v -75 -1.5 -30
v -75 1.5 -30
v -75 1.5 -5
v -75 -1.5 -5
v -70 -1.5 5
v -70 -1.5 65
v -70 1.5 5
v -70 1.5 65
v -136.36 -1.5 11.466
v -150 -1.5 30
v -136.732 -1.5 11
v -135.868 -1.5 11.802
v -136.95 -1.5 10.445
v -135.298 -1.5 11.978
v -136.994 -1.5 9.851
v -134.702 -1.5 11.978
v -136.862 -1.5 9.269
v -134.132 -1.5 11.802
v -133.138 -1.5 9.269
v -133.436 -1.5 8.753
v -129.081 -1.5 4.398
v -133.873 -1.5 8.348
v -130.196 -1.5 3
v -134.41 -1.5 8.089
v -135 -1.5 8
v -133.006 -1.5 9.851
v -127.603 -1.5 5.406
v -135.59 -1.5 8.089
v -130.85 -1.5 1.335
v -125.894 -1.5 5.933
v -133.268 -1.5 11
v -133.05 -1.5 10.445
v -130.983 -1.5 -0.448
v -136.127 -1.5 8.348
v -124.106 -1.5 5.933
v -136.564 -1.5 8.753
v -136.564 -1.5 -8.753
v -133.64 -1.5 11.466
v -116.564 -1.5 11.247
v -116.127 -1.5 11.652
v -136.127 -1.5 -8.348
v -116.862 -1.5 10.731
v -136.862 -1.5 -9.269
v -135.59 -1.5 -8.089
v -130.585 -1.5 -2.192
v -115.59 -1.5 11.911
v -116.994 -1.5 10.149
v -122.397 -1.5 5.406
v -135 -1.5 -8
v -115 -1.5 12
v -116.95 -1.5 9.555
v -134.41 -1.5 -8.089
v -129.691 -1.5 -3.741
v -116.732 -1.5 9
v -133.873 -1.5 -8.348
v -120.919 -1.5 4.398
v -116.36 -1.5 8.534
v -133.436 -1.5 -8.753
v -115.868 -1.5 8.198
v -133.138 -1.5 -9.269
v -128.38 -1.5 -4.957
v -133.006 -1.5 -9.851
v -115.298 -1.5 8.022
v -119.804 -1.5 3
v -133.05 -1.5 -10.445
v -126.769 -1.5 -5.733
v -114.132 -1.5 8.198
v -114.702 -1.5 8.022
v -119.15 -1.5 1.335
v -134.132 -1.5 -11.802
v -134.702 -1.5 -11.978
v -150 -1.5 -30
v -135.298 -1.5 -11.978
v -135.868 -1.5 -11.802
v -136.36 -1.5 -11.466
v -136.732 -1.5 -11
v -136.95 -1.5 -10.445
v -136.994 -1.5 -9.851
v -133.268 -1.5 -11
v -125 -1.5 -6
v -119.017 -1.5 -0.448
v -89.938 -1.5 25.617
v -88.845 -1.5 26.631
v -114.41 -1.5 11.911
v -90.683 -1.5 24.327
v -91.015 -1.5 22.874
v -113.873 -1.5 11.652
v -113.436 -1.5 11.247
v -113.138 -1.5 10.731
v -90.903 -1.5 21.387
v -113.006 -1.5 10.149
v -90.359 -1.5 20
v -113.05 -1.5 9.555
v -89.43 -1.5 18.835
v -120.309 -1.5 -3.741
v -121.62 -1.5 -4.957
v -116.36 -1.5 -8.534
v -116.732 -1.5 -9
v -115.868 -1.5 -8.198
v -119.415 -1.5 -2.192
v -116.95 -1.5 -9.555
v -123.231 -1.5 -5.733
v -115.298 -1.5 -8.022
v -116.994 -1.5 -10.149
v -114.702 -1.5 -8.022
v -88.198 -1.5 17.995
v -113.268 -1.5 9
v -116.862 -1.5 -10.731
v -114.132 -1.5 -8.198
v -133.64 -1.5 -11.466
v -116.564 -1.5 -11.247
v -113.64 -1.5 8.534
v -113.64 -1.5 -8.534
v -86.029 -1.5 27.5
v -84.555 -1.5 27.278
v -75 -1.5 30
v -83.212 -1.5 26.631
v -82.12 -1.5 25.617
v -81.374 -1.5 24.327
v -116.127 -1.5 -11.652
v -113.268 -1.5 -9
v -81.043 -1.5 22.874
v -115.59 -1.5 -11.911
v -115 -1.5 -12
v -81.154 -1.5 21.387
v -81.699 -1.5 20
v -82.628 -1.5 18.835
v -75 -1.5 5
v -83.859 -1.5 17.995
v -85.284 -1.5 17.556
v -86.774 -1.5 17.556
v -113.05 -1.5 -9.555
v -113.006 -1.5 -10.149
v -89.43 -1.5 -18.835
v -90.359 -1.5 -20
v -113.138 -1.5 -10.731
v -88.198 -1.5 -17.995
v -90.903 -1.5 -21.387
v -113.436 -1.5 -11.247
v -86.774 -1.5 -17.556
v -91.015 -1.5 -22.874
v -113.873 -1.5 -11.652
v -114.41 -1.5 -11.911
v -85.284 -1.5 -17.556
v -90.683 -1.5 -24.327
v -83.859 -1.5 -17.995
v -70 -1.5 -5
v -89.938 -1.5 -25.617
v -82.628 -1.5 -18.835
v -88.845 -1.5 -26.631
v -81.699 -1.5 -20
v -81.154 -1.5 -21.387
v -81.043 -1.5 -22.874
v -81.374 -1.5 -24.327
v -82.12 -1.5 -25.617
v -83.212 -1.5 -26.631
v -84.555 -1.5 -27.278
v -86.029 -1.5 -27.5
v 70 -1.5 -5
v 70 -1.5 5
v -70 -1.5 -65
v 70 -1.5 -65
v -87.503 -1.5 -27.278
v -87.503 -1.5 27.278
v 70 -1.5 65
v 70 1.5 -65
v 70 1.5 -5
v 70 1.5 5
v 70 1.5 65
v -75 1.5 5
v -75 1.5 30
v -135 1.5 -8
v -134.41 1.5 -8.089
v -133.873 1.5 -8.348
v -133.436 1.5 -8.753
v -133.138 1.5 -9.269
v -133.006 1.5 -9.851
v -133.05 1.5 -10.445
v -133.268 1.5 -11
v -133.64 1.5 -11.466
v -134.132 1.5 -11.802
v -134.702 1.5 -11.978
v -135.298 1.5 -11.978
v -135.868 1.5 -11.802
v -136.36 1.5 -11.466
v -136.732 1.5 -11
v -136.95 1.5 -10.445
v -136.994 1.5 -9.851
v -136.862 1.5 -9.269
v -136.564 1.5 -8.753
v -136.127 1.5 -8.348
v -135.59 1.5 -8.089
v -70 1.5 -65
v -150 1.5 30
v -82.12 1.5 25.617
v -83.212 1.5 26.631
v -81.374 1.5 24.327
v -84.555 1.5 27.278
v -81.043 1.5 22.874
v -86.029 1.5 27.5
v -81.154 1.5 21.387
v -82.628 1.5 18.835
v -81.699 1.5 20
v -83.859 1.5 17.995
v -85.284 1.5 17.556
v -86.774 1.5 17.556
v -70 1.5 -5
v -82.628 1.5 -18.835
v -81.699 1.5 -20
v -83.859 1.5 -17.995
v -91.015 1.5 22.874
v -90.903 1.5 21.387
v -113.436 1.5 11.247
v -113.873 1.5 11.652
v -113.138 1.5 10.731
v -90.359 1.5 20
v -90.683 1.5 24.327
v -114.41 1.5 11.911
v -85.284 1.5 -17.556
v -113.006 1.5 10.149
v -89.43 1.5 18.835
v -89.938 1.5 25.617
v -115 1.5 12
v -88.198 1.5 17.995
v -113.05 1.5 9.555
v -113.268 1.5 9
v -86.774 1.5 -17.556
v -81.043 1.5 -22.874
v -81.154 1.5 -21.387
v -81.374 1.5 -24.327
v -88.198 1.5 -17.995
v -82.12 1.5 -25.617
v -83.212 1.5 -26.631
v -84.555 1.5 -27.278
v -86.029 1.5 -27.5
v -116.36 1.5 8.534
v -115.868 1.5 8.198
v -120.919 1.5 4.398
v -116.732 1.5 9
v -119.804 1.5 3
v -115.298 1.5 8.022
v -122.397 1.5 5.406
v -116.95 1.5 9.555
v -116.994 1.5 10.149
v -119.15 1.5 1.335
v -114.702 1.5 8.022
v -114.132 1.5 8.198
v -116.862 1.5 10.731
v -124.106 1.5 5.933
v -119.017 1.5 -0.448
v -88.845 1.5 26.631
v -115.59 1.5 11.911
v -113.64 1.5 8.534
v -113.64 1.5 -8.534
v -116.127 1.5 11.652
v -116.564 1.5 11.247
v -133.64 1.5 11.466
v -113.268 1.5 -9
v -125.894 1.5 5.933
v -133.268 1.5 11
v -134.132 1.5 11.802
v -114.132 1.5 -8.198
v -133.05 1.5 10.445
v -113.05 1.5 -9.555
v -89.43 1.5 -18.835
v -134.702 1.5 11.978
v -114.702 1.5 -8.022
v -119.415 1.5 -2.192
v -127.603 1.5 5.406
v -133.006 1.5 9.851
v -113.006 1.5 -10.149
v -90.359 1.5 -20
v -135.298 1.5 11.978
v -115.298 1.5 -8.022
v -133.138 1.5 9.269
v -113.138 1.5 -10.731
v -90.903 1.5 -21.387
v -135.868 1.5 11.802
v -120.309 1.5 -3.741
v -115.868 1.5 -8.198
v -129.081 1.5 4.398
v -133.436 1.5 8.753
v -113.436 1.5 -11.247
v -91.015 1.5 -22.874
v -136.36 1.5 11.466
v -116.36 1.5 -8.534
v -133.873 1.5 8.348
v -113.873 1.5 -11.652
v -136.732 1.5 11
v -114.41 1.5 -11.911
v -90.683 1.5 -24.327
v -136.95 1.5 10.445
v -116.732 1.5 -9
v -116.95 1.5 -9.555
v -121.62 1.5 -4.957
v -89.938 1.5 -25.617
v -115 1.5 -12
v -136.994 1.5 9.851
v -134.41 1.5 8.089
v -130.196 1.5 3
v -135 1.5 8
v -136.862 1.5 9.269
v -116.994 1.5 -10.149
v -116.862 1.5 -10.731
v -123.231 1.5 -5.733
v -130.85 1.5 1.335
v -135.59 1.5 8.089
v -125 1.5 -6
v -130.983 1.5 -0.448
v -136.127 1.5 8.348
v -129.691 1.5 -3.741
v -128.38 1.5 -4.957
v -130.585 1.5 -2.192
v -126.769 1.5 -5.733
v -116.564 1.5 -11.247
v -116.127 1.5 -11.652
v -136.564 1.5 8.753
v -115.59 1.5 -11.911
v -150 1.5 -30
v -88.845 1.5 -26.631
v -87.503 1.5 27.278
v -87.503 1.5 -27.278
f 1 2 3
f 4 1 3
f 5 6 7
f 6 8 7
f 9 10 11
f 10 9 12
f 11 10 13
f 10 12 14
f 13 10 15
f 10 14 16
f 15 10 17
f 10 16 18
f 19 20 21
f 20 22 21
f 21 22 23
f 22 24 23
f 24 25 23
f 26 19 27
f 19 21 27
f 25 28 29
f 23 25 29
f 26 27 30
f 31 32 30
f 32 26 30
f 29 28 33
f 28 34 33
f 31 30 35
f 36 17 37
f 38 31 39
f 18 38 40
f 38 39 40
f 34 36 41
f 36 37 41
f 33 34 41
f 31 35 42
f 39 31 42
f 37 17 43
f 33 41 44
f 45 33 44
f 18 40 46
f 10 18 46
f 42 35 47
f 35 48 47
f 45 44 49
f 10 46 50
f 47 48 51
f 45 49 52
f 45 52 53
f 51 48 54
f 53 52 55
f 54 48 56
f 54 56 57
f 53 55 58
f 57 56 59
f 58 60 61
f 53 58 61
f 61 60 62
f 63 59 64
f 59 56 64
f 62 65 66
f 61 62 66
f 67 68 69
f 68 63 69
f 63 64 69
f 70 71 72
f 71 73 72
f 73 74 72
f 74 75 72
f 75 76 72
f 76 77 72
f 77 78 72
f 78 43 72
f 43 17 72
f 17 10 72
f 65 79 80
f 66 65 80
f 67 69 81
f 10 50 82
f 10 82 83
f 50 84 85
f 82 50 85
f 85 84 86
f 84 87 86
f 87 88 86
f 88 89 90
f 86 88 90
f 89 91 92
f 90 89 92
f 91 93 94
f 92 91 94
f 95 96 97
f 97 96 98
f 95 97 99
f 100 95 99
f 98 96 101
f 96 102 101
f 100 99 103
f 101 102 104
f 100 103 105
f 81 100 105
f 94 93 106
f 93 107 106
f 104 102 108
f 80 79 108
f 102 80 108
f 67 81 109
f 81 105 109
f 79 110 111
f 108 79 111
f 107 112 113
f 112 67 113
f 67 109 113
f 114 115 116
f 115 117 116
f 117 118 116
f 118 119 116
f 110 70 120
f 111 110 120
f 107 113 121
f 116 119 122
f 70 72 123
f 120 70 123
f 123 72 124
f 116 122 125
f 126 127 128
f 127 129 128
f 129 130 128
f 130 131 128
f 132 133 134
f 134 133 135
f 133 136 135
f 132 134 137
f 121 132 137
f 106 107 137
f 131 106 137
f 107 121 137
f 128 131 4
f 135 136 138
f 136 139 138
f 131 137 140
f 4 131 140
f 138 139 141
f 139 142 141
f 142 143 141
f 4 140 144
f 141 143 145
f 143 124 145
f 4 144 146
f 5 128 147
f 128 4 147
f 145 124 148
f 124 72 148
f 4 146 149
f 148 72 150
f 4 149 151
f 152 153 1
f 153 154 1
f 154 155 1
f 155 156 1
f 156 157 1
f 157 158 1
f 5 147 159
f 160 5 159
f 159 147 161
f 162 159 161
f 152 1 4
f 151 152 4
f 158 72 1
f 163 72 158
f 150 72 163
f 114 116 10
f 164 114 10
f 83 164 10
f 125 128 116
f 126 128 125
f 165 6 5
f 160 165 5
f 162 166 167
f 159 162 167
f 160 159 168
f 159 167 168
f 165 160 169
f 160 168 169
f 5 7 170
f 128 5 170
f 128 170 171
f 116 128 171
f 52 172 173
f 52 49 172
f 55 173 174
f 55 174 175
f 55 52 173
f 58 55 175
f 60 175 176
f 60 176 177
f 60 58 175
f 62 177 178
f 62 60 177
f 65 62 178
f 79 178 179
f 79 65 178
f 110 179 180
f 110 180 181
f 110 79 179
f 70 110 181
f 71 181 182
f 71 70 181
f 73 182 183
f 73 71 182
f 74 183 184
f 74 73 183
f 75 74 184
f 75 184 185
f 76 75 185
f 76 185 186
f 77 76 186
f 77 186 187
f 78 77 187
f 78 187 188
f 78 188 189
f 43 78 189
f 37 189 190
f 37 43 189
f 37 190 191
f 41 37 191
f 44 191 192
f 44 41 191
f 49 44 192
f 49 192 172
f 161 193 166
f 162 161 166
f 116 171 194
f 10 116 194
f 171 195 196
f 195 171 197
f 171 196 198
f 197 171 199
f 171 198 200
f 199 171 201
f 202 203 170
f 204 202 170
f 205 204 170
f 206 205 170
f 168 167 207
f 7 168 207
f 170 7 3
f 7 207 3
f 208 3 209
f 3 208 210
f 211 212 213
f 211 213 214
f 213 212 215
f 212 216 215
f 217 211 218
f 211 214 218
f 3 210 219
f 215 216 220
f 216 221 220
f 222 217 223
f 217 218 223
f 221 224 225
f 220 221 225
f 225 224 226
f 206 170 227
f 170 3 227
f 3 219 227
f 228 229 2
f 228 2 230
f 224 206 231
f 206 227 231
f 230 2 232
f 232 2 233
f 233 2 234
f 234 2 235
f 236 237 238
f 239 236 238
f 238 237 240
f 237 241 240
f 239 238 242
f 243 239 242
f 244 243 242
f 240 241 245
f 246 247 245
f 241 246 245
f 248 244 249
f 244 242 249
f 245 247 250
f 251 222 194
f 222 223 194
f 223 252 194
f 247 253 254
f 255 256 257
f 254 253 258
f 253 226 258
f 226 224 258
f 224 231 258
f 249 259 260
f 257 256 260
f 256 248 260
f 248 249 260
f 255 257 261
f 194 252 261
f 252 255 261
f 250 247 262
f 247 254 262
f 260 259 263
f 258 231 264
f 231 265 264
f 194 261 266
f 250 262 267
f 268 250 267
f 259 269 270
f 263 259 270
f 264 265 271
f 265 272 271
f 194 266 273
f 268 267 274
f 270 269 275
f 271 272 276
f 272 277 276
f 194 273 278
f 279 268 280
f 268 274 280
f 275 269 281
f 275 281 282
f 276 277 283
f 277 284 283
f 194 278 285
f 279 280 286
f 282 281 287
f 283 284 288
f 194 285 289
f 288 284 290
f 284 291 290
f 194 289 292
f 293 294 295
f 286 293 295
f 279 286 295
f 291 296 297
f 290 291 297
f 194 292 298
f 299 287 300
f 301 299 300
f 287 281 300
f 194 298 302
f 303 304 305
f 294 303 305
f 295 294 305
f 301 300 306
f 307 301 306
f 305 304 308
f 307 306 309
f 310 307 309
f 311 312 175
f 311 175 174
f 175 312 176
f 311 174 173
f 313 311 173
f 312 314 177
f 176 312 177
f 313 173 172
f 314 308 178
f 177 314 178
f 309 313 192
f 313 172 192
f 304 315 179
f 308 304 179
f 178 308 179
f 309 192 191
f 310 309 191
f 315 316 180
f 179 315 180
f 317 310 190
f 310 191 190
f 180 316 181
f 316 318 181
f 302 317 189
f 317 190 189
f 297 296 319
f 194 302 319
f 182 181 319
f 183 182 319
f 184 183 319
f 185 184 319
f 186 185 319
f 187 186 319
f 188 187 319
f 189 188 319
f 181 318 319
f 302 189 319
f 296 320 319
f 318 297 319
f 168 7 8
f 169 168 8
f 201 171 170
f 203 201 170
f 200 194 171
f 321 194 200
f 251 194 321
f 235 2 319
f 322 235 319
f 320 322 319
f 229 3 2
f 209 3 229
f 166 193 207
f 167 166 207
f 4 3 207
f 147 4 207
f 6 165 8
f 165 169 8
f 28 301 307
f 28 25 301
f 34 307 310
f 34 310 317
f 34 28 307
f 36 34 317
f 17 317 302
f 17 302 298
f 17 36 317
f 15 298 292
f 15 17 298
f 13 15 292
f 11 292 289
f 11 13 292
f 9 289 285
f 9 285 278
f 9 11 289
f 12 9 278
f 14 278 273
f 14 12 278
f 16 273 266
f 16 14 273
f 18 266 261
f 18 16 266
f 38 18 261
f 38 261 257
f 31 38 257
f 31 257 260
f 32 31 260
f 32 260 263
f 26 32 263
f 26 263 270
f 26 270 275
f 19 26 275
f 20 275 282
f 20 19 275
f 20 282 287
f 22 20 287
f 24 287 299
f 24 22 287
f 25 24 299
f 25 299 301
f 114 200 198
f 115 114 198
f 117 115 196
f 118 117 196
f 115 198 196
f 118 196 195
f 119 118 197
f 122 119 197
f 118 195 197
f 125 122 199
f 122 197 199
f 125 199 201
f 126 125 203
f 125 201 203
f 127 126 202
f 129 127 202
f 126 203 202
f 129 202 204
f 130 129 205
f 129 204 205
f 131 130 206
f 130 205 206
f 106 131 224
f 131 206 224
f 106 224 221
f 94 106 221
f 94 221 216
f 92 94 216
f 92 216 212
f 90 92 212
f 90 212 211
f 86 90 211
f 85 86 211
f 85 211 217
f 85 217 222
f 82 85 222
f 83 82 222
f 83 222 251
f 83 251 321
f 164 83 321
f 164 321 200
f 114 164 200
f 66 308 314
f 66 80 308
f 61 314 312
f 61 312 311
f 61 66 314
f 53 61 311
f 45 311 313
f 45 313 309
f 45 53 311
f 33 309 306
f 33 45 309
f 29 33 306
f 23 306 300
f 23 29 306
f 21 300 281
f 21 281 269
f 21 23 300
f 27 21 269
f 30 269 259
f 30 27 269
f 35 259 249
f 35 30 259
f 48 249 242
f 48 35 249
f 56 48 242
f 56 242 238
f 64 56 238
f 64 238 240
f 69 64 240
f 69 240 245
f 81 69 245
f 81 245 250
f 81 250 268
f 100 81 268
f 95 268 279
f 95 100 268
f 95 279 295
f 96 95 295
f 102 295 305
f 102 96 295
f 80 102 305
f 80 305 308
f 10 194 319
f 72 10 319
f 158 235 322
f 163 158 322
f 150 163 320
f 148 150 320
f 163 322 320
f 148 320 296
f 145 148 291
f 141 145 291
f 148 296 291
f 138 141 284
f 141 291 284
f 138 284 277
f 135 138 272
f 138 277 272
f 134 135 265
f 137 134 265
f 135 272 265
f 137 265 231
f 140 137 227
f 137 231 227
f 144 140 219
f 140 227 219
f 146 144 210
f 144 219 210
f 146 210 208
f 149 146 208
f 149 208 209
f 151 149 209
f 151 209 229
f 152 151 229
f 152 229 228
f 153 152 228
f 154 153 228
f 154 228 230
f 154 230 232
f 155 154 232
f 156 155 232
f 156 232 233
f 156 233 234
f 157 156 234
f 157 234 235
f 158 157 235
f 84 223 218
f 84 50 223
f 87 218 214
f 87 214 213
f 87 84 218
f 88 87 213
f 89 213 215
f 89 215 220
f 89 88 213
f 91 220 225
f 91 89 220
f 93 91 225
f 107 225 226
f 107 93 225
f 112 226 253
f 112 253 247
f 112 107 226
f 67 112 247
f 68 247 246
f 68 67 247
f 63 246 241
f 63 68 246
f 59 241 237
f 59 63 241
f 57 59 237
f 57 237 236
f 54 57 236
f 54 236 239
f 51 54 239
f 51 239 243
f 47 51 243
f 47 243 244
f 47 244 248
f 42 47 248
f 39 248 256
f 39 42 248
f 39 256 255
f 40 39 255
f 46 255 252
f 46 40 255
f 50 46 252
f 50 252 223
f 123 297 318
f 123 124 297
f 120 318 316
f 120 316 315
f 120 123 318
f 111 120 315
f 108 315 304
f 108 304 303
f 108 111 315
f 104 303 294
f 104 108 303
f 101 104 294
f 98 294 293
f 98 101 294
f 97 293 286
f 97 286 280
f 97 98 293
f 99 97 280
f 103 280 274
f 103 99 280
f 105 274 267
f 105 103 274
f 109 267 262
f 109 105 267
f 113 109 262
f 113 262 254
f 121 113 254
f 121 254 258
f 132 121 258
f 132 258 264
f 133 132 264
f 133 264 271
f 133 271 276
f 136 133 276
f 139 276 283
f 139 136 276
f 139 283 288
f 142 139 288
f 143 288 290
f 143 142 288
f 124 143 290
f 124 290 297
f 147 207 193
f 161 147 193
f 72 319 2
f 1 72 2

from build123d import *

# Parameters (mm, degrees)
SKETCH1_R             = 6
SKETCH1_R_2           = 2
SKETCH1_R_3           = 7.5
BOSS_EXTRUDE1_DEPTH   = 1.5
SKETCH2_W             = 115.219632385
SKETCH2_H             = 145.344306737
CUT_EXTRUDE1_DEPTH    = 164.505351594
DELETEFACE1_START     = -1.5
DELETEFACE1_OUTLINE_R = 7.5
DELETEFACE1_DEPTH     = 3
SKETCH4_R             = 5
CUT_EXTRUDE2_DEPTH    = 164.505351594


# Read off the part's stored shape, not the designer's step: DeleteFace1
with BuildPart() as part:
    # Sketch1 → Boss-Extrude1 (new, symmetric)
    with BuildSketch(Plane(origin=(0, 0, 0), x_dir=(1, 0, 0), z_dir=(0, 1, 0))):
        Polygon((70, 65), (70, 5), (75, 5), (75, 30), (150, 30), (150, -30), (75, -30), (75, -5), (70, -5), (70, -65), (-70, -65), (-70, -5), (-75, -5), (-75, -30), (-150, -30), (-150, 30), (-75, 30), (-75, 5), (-70, 5), (-70, 65), align=None)
        with Locations(Location((125, 0, 0), (0, 0, 270))):
            Circle(SKETCH1_R, mode=Mode.SUBTRACT)
        with Locations(Location((115, 10, 0), (0, 0, 270))):
            Circle(SKETCH1_R_2, mode=Mode.SUBTRACT)
        with Locations(Location((135, 10, 0), (0, 0, 90))):
            Circle(SKETCH1_R_2, mode=Mode.SUBTRACT)
        with Locations(Location((135, -10, 0), (0, 0, 270))):
            Circle(SKETCH1_R_2, mode=Mode.SUBTRACT)
        with Locations(Location((115, -10, 0), (0, 0, 90))):
            Circle(SKETCH1_R_2, mode=Mode.SUBTRACT)
        with Locations(Location((-115, -10, 0), (0, 0, 270))):
            Circle(SKETCH1_R_2, mode=Mode.SUBTRACT)
        with Locations(Location((-135, -10, 0), (0, 0, 90))):
            Circle(SKETCH1_R_2, mode=Mode.SUBTRACT)
        with Locations(Location((-135, 10, 0), (0, 0, 270))):
            Circle(SKETCH1_R_2, mode=Mode.SUBTRACT)
        with Locations(Location((-125, 0, 0), (0, 0, 90))):
            Circle(SKETCH1_R, mode=Mode.SUBTRACT)
        with Locations(Location((-115, 10, 0), (0, 0, 90))):
            Circle(SKETCH1_R_2, mode=Mode.SUBTRACT)
        with Locations(Location((100, 0, 0), (0, 0, 270))):
            Circle(SKETCH1_R_3, mode=Mode.SUBTRACT)
        with Locations(Location((-100, 0, 0), (0, 0, 90))):
            Circle(SKETCH1_R_3, mode=Mode.SUBTRACT)
    extrude(amount=BOSS_EXTRUDE1_DEPTH, both=True)

    # Sketch2 → Cut-Extrude1 (cut, through all)
    with BuildSketch(Plane(origin=(0, 1.5, 0), x_dir=(1, 0, 0), z_dir=(0, 1, 0))):
        with Locations((127.609816193, -7.672153369)):
            Rectangle(SKETCH2_W, SKETCH2_H)
    extrude(amount=-CUT_EXTRUDE1_DEPTH, mode=Mode.SUBTRACT)

    # DeleteFace1 outline → DeleteFace1 (add)
    with BuildSketch(Plane(origin=(0, 0, 0), x_dir=(1, 0, 0), z_dir=(0, 1, 0)).offset(DELETEFACE1_START)):
        with Locations((-100, 0)):
            Circle(DELETEFACE1_OUTLINE_R)
    extrude(amount=DELETEFACE1_DEPTH)

    # Sketch4 → Cut-Extrude2 (cut, through all)
    with BuildSketch(Plane(origin=(0, 1.5, 0), x_dir=(1, 0, 0), z_dir=(0, 1, 0))):
        with Locations(Location((-86.02885683, -22.5, 0), (0, 0, 270))):
            Circle(SKETCH4_R)
        with Locations(Location((-86.02885683, 22.5, 0), (0, 0, 90))):
            Circle(SKETCH4_R)
    extrude(amount=-CUT_EXTRUDE2_DEPTH, mode=Mode.SUBTRACT)


solid = part.part
